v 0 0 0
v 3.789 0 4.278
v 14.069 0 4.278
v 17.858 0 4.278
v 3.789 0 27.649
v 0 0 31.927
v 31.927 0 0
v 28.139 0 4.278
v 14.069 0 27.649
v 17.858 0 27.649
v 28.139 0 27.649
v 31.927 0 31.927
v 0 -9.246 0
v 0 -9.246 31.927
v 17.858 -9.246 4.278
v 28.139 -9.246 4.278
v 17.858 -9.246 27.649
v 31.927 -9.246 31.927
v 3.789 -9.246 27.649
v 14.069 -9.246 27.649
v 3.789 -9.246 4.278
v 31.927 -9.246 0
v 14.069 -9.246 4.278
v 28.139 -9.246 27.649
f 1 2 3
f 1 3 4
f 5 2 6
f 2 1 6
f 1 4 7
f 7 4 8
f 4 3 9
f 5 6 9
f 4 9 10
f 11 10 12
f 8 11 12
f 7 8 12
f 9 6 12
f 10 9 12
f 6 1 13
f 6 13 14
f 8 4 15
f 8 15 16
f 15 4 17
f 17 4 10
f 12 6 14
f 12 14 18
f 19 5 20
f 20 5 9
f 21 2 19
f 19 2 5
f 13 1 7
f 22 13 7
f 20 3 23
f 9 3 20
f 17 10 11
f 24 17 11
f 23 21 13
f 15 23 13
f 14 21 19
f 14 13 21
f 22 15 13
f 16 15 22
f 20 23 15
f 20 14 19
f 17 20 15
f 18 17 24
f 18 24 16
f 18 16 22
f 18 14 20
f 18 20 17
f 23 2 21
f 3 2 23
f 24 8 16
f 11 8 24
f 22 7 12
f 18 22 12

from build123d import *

# Parameters (mm, degrees)
F0_W     = 31.927392
F0_H     = 31.927392
F0_W_2   = 10.280441
F0_H_2   = 23.370836
F0_W_3   = 10.280442
F1_DEPTH = 9.2456


with BuildPart() as f1:
    # F0 (on Front) → F1 (new body)
    with BuildSketch(Plane.XZ):
        with Locations((15.963696, 15.963696)):
            Rectangle(F0_W, F0_H)
        with Locations((8.929057, 15.963696)):
            Rectangle(F0_W_2, F0_H_2, mode=Mode.SUBTRACT)
        with Locations((22.998335, 15.963696)):
            Rectangle(F0_W_3, F0_H_2, mode=Mode.SUBTRACT)
    extrude(amount=F1_DEPTH)


solid = f1.part
